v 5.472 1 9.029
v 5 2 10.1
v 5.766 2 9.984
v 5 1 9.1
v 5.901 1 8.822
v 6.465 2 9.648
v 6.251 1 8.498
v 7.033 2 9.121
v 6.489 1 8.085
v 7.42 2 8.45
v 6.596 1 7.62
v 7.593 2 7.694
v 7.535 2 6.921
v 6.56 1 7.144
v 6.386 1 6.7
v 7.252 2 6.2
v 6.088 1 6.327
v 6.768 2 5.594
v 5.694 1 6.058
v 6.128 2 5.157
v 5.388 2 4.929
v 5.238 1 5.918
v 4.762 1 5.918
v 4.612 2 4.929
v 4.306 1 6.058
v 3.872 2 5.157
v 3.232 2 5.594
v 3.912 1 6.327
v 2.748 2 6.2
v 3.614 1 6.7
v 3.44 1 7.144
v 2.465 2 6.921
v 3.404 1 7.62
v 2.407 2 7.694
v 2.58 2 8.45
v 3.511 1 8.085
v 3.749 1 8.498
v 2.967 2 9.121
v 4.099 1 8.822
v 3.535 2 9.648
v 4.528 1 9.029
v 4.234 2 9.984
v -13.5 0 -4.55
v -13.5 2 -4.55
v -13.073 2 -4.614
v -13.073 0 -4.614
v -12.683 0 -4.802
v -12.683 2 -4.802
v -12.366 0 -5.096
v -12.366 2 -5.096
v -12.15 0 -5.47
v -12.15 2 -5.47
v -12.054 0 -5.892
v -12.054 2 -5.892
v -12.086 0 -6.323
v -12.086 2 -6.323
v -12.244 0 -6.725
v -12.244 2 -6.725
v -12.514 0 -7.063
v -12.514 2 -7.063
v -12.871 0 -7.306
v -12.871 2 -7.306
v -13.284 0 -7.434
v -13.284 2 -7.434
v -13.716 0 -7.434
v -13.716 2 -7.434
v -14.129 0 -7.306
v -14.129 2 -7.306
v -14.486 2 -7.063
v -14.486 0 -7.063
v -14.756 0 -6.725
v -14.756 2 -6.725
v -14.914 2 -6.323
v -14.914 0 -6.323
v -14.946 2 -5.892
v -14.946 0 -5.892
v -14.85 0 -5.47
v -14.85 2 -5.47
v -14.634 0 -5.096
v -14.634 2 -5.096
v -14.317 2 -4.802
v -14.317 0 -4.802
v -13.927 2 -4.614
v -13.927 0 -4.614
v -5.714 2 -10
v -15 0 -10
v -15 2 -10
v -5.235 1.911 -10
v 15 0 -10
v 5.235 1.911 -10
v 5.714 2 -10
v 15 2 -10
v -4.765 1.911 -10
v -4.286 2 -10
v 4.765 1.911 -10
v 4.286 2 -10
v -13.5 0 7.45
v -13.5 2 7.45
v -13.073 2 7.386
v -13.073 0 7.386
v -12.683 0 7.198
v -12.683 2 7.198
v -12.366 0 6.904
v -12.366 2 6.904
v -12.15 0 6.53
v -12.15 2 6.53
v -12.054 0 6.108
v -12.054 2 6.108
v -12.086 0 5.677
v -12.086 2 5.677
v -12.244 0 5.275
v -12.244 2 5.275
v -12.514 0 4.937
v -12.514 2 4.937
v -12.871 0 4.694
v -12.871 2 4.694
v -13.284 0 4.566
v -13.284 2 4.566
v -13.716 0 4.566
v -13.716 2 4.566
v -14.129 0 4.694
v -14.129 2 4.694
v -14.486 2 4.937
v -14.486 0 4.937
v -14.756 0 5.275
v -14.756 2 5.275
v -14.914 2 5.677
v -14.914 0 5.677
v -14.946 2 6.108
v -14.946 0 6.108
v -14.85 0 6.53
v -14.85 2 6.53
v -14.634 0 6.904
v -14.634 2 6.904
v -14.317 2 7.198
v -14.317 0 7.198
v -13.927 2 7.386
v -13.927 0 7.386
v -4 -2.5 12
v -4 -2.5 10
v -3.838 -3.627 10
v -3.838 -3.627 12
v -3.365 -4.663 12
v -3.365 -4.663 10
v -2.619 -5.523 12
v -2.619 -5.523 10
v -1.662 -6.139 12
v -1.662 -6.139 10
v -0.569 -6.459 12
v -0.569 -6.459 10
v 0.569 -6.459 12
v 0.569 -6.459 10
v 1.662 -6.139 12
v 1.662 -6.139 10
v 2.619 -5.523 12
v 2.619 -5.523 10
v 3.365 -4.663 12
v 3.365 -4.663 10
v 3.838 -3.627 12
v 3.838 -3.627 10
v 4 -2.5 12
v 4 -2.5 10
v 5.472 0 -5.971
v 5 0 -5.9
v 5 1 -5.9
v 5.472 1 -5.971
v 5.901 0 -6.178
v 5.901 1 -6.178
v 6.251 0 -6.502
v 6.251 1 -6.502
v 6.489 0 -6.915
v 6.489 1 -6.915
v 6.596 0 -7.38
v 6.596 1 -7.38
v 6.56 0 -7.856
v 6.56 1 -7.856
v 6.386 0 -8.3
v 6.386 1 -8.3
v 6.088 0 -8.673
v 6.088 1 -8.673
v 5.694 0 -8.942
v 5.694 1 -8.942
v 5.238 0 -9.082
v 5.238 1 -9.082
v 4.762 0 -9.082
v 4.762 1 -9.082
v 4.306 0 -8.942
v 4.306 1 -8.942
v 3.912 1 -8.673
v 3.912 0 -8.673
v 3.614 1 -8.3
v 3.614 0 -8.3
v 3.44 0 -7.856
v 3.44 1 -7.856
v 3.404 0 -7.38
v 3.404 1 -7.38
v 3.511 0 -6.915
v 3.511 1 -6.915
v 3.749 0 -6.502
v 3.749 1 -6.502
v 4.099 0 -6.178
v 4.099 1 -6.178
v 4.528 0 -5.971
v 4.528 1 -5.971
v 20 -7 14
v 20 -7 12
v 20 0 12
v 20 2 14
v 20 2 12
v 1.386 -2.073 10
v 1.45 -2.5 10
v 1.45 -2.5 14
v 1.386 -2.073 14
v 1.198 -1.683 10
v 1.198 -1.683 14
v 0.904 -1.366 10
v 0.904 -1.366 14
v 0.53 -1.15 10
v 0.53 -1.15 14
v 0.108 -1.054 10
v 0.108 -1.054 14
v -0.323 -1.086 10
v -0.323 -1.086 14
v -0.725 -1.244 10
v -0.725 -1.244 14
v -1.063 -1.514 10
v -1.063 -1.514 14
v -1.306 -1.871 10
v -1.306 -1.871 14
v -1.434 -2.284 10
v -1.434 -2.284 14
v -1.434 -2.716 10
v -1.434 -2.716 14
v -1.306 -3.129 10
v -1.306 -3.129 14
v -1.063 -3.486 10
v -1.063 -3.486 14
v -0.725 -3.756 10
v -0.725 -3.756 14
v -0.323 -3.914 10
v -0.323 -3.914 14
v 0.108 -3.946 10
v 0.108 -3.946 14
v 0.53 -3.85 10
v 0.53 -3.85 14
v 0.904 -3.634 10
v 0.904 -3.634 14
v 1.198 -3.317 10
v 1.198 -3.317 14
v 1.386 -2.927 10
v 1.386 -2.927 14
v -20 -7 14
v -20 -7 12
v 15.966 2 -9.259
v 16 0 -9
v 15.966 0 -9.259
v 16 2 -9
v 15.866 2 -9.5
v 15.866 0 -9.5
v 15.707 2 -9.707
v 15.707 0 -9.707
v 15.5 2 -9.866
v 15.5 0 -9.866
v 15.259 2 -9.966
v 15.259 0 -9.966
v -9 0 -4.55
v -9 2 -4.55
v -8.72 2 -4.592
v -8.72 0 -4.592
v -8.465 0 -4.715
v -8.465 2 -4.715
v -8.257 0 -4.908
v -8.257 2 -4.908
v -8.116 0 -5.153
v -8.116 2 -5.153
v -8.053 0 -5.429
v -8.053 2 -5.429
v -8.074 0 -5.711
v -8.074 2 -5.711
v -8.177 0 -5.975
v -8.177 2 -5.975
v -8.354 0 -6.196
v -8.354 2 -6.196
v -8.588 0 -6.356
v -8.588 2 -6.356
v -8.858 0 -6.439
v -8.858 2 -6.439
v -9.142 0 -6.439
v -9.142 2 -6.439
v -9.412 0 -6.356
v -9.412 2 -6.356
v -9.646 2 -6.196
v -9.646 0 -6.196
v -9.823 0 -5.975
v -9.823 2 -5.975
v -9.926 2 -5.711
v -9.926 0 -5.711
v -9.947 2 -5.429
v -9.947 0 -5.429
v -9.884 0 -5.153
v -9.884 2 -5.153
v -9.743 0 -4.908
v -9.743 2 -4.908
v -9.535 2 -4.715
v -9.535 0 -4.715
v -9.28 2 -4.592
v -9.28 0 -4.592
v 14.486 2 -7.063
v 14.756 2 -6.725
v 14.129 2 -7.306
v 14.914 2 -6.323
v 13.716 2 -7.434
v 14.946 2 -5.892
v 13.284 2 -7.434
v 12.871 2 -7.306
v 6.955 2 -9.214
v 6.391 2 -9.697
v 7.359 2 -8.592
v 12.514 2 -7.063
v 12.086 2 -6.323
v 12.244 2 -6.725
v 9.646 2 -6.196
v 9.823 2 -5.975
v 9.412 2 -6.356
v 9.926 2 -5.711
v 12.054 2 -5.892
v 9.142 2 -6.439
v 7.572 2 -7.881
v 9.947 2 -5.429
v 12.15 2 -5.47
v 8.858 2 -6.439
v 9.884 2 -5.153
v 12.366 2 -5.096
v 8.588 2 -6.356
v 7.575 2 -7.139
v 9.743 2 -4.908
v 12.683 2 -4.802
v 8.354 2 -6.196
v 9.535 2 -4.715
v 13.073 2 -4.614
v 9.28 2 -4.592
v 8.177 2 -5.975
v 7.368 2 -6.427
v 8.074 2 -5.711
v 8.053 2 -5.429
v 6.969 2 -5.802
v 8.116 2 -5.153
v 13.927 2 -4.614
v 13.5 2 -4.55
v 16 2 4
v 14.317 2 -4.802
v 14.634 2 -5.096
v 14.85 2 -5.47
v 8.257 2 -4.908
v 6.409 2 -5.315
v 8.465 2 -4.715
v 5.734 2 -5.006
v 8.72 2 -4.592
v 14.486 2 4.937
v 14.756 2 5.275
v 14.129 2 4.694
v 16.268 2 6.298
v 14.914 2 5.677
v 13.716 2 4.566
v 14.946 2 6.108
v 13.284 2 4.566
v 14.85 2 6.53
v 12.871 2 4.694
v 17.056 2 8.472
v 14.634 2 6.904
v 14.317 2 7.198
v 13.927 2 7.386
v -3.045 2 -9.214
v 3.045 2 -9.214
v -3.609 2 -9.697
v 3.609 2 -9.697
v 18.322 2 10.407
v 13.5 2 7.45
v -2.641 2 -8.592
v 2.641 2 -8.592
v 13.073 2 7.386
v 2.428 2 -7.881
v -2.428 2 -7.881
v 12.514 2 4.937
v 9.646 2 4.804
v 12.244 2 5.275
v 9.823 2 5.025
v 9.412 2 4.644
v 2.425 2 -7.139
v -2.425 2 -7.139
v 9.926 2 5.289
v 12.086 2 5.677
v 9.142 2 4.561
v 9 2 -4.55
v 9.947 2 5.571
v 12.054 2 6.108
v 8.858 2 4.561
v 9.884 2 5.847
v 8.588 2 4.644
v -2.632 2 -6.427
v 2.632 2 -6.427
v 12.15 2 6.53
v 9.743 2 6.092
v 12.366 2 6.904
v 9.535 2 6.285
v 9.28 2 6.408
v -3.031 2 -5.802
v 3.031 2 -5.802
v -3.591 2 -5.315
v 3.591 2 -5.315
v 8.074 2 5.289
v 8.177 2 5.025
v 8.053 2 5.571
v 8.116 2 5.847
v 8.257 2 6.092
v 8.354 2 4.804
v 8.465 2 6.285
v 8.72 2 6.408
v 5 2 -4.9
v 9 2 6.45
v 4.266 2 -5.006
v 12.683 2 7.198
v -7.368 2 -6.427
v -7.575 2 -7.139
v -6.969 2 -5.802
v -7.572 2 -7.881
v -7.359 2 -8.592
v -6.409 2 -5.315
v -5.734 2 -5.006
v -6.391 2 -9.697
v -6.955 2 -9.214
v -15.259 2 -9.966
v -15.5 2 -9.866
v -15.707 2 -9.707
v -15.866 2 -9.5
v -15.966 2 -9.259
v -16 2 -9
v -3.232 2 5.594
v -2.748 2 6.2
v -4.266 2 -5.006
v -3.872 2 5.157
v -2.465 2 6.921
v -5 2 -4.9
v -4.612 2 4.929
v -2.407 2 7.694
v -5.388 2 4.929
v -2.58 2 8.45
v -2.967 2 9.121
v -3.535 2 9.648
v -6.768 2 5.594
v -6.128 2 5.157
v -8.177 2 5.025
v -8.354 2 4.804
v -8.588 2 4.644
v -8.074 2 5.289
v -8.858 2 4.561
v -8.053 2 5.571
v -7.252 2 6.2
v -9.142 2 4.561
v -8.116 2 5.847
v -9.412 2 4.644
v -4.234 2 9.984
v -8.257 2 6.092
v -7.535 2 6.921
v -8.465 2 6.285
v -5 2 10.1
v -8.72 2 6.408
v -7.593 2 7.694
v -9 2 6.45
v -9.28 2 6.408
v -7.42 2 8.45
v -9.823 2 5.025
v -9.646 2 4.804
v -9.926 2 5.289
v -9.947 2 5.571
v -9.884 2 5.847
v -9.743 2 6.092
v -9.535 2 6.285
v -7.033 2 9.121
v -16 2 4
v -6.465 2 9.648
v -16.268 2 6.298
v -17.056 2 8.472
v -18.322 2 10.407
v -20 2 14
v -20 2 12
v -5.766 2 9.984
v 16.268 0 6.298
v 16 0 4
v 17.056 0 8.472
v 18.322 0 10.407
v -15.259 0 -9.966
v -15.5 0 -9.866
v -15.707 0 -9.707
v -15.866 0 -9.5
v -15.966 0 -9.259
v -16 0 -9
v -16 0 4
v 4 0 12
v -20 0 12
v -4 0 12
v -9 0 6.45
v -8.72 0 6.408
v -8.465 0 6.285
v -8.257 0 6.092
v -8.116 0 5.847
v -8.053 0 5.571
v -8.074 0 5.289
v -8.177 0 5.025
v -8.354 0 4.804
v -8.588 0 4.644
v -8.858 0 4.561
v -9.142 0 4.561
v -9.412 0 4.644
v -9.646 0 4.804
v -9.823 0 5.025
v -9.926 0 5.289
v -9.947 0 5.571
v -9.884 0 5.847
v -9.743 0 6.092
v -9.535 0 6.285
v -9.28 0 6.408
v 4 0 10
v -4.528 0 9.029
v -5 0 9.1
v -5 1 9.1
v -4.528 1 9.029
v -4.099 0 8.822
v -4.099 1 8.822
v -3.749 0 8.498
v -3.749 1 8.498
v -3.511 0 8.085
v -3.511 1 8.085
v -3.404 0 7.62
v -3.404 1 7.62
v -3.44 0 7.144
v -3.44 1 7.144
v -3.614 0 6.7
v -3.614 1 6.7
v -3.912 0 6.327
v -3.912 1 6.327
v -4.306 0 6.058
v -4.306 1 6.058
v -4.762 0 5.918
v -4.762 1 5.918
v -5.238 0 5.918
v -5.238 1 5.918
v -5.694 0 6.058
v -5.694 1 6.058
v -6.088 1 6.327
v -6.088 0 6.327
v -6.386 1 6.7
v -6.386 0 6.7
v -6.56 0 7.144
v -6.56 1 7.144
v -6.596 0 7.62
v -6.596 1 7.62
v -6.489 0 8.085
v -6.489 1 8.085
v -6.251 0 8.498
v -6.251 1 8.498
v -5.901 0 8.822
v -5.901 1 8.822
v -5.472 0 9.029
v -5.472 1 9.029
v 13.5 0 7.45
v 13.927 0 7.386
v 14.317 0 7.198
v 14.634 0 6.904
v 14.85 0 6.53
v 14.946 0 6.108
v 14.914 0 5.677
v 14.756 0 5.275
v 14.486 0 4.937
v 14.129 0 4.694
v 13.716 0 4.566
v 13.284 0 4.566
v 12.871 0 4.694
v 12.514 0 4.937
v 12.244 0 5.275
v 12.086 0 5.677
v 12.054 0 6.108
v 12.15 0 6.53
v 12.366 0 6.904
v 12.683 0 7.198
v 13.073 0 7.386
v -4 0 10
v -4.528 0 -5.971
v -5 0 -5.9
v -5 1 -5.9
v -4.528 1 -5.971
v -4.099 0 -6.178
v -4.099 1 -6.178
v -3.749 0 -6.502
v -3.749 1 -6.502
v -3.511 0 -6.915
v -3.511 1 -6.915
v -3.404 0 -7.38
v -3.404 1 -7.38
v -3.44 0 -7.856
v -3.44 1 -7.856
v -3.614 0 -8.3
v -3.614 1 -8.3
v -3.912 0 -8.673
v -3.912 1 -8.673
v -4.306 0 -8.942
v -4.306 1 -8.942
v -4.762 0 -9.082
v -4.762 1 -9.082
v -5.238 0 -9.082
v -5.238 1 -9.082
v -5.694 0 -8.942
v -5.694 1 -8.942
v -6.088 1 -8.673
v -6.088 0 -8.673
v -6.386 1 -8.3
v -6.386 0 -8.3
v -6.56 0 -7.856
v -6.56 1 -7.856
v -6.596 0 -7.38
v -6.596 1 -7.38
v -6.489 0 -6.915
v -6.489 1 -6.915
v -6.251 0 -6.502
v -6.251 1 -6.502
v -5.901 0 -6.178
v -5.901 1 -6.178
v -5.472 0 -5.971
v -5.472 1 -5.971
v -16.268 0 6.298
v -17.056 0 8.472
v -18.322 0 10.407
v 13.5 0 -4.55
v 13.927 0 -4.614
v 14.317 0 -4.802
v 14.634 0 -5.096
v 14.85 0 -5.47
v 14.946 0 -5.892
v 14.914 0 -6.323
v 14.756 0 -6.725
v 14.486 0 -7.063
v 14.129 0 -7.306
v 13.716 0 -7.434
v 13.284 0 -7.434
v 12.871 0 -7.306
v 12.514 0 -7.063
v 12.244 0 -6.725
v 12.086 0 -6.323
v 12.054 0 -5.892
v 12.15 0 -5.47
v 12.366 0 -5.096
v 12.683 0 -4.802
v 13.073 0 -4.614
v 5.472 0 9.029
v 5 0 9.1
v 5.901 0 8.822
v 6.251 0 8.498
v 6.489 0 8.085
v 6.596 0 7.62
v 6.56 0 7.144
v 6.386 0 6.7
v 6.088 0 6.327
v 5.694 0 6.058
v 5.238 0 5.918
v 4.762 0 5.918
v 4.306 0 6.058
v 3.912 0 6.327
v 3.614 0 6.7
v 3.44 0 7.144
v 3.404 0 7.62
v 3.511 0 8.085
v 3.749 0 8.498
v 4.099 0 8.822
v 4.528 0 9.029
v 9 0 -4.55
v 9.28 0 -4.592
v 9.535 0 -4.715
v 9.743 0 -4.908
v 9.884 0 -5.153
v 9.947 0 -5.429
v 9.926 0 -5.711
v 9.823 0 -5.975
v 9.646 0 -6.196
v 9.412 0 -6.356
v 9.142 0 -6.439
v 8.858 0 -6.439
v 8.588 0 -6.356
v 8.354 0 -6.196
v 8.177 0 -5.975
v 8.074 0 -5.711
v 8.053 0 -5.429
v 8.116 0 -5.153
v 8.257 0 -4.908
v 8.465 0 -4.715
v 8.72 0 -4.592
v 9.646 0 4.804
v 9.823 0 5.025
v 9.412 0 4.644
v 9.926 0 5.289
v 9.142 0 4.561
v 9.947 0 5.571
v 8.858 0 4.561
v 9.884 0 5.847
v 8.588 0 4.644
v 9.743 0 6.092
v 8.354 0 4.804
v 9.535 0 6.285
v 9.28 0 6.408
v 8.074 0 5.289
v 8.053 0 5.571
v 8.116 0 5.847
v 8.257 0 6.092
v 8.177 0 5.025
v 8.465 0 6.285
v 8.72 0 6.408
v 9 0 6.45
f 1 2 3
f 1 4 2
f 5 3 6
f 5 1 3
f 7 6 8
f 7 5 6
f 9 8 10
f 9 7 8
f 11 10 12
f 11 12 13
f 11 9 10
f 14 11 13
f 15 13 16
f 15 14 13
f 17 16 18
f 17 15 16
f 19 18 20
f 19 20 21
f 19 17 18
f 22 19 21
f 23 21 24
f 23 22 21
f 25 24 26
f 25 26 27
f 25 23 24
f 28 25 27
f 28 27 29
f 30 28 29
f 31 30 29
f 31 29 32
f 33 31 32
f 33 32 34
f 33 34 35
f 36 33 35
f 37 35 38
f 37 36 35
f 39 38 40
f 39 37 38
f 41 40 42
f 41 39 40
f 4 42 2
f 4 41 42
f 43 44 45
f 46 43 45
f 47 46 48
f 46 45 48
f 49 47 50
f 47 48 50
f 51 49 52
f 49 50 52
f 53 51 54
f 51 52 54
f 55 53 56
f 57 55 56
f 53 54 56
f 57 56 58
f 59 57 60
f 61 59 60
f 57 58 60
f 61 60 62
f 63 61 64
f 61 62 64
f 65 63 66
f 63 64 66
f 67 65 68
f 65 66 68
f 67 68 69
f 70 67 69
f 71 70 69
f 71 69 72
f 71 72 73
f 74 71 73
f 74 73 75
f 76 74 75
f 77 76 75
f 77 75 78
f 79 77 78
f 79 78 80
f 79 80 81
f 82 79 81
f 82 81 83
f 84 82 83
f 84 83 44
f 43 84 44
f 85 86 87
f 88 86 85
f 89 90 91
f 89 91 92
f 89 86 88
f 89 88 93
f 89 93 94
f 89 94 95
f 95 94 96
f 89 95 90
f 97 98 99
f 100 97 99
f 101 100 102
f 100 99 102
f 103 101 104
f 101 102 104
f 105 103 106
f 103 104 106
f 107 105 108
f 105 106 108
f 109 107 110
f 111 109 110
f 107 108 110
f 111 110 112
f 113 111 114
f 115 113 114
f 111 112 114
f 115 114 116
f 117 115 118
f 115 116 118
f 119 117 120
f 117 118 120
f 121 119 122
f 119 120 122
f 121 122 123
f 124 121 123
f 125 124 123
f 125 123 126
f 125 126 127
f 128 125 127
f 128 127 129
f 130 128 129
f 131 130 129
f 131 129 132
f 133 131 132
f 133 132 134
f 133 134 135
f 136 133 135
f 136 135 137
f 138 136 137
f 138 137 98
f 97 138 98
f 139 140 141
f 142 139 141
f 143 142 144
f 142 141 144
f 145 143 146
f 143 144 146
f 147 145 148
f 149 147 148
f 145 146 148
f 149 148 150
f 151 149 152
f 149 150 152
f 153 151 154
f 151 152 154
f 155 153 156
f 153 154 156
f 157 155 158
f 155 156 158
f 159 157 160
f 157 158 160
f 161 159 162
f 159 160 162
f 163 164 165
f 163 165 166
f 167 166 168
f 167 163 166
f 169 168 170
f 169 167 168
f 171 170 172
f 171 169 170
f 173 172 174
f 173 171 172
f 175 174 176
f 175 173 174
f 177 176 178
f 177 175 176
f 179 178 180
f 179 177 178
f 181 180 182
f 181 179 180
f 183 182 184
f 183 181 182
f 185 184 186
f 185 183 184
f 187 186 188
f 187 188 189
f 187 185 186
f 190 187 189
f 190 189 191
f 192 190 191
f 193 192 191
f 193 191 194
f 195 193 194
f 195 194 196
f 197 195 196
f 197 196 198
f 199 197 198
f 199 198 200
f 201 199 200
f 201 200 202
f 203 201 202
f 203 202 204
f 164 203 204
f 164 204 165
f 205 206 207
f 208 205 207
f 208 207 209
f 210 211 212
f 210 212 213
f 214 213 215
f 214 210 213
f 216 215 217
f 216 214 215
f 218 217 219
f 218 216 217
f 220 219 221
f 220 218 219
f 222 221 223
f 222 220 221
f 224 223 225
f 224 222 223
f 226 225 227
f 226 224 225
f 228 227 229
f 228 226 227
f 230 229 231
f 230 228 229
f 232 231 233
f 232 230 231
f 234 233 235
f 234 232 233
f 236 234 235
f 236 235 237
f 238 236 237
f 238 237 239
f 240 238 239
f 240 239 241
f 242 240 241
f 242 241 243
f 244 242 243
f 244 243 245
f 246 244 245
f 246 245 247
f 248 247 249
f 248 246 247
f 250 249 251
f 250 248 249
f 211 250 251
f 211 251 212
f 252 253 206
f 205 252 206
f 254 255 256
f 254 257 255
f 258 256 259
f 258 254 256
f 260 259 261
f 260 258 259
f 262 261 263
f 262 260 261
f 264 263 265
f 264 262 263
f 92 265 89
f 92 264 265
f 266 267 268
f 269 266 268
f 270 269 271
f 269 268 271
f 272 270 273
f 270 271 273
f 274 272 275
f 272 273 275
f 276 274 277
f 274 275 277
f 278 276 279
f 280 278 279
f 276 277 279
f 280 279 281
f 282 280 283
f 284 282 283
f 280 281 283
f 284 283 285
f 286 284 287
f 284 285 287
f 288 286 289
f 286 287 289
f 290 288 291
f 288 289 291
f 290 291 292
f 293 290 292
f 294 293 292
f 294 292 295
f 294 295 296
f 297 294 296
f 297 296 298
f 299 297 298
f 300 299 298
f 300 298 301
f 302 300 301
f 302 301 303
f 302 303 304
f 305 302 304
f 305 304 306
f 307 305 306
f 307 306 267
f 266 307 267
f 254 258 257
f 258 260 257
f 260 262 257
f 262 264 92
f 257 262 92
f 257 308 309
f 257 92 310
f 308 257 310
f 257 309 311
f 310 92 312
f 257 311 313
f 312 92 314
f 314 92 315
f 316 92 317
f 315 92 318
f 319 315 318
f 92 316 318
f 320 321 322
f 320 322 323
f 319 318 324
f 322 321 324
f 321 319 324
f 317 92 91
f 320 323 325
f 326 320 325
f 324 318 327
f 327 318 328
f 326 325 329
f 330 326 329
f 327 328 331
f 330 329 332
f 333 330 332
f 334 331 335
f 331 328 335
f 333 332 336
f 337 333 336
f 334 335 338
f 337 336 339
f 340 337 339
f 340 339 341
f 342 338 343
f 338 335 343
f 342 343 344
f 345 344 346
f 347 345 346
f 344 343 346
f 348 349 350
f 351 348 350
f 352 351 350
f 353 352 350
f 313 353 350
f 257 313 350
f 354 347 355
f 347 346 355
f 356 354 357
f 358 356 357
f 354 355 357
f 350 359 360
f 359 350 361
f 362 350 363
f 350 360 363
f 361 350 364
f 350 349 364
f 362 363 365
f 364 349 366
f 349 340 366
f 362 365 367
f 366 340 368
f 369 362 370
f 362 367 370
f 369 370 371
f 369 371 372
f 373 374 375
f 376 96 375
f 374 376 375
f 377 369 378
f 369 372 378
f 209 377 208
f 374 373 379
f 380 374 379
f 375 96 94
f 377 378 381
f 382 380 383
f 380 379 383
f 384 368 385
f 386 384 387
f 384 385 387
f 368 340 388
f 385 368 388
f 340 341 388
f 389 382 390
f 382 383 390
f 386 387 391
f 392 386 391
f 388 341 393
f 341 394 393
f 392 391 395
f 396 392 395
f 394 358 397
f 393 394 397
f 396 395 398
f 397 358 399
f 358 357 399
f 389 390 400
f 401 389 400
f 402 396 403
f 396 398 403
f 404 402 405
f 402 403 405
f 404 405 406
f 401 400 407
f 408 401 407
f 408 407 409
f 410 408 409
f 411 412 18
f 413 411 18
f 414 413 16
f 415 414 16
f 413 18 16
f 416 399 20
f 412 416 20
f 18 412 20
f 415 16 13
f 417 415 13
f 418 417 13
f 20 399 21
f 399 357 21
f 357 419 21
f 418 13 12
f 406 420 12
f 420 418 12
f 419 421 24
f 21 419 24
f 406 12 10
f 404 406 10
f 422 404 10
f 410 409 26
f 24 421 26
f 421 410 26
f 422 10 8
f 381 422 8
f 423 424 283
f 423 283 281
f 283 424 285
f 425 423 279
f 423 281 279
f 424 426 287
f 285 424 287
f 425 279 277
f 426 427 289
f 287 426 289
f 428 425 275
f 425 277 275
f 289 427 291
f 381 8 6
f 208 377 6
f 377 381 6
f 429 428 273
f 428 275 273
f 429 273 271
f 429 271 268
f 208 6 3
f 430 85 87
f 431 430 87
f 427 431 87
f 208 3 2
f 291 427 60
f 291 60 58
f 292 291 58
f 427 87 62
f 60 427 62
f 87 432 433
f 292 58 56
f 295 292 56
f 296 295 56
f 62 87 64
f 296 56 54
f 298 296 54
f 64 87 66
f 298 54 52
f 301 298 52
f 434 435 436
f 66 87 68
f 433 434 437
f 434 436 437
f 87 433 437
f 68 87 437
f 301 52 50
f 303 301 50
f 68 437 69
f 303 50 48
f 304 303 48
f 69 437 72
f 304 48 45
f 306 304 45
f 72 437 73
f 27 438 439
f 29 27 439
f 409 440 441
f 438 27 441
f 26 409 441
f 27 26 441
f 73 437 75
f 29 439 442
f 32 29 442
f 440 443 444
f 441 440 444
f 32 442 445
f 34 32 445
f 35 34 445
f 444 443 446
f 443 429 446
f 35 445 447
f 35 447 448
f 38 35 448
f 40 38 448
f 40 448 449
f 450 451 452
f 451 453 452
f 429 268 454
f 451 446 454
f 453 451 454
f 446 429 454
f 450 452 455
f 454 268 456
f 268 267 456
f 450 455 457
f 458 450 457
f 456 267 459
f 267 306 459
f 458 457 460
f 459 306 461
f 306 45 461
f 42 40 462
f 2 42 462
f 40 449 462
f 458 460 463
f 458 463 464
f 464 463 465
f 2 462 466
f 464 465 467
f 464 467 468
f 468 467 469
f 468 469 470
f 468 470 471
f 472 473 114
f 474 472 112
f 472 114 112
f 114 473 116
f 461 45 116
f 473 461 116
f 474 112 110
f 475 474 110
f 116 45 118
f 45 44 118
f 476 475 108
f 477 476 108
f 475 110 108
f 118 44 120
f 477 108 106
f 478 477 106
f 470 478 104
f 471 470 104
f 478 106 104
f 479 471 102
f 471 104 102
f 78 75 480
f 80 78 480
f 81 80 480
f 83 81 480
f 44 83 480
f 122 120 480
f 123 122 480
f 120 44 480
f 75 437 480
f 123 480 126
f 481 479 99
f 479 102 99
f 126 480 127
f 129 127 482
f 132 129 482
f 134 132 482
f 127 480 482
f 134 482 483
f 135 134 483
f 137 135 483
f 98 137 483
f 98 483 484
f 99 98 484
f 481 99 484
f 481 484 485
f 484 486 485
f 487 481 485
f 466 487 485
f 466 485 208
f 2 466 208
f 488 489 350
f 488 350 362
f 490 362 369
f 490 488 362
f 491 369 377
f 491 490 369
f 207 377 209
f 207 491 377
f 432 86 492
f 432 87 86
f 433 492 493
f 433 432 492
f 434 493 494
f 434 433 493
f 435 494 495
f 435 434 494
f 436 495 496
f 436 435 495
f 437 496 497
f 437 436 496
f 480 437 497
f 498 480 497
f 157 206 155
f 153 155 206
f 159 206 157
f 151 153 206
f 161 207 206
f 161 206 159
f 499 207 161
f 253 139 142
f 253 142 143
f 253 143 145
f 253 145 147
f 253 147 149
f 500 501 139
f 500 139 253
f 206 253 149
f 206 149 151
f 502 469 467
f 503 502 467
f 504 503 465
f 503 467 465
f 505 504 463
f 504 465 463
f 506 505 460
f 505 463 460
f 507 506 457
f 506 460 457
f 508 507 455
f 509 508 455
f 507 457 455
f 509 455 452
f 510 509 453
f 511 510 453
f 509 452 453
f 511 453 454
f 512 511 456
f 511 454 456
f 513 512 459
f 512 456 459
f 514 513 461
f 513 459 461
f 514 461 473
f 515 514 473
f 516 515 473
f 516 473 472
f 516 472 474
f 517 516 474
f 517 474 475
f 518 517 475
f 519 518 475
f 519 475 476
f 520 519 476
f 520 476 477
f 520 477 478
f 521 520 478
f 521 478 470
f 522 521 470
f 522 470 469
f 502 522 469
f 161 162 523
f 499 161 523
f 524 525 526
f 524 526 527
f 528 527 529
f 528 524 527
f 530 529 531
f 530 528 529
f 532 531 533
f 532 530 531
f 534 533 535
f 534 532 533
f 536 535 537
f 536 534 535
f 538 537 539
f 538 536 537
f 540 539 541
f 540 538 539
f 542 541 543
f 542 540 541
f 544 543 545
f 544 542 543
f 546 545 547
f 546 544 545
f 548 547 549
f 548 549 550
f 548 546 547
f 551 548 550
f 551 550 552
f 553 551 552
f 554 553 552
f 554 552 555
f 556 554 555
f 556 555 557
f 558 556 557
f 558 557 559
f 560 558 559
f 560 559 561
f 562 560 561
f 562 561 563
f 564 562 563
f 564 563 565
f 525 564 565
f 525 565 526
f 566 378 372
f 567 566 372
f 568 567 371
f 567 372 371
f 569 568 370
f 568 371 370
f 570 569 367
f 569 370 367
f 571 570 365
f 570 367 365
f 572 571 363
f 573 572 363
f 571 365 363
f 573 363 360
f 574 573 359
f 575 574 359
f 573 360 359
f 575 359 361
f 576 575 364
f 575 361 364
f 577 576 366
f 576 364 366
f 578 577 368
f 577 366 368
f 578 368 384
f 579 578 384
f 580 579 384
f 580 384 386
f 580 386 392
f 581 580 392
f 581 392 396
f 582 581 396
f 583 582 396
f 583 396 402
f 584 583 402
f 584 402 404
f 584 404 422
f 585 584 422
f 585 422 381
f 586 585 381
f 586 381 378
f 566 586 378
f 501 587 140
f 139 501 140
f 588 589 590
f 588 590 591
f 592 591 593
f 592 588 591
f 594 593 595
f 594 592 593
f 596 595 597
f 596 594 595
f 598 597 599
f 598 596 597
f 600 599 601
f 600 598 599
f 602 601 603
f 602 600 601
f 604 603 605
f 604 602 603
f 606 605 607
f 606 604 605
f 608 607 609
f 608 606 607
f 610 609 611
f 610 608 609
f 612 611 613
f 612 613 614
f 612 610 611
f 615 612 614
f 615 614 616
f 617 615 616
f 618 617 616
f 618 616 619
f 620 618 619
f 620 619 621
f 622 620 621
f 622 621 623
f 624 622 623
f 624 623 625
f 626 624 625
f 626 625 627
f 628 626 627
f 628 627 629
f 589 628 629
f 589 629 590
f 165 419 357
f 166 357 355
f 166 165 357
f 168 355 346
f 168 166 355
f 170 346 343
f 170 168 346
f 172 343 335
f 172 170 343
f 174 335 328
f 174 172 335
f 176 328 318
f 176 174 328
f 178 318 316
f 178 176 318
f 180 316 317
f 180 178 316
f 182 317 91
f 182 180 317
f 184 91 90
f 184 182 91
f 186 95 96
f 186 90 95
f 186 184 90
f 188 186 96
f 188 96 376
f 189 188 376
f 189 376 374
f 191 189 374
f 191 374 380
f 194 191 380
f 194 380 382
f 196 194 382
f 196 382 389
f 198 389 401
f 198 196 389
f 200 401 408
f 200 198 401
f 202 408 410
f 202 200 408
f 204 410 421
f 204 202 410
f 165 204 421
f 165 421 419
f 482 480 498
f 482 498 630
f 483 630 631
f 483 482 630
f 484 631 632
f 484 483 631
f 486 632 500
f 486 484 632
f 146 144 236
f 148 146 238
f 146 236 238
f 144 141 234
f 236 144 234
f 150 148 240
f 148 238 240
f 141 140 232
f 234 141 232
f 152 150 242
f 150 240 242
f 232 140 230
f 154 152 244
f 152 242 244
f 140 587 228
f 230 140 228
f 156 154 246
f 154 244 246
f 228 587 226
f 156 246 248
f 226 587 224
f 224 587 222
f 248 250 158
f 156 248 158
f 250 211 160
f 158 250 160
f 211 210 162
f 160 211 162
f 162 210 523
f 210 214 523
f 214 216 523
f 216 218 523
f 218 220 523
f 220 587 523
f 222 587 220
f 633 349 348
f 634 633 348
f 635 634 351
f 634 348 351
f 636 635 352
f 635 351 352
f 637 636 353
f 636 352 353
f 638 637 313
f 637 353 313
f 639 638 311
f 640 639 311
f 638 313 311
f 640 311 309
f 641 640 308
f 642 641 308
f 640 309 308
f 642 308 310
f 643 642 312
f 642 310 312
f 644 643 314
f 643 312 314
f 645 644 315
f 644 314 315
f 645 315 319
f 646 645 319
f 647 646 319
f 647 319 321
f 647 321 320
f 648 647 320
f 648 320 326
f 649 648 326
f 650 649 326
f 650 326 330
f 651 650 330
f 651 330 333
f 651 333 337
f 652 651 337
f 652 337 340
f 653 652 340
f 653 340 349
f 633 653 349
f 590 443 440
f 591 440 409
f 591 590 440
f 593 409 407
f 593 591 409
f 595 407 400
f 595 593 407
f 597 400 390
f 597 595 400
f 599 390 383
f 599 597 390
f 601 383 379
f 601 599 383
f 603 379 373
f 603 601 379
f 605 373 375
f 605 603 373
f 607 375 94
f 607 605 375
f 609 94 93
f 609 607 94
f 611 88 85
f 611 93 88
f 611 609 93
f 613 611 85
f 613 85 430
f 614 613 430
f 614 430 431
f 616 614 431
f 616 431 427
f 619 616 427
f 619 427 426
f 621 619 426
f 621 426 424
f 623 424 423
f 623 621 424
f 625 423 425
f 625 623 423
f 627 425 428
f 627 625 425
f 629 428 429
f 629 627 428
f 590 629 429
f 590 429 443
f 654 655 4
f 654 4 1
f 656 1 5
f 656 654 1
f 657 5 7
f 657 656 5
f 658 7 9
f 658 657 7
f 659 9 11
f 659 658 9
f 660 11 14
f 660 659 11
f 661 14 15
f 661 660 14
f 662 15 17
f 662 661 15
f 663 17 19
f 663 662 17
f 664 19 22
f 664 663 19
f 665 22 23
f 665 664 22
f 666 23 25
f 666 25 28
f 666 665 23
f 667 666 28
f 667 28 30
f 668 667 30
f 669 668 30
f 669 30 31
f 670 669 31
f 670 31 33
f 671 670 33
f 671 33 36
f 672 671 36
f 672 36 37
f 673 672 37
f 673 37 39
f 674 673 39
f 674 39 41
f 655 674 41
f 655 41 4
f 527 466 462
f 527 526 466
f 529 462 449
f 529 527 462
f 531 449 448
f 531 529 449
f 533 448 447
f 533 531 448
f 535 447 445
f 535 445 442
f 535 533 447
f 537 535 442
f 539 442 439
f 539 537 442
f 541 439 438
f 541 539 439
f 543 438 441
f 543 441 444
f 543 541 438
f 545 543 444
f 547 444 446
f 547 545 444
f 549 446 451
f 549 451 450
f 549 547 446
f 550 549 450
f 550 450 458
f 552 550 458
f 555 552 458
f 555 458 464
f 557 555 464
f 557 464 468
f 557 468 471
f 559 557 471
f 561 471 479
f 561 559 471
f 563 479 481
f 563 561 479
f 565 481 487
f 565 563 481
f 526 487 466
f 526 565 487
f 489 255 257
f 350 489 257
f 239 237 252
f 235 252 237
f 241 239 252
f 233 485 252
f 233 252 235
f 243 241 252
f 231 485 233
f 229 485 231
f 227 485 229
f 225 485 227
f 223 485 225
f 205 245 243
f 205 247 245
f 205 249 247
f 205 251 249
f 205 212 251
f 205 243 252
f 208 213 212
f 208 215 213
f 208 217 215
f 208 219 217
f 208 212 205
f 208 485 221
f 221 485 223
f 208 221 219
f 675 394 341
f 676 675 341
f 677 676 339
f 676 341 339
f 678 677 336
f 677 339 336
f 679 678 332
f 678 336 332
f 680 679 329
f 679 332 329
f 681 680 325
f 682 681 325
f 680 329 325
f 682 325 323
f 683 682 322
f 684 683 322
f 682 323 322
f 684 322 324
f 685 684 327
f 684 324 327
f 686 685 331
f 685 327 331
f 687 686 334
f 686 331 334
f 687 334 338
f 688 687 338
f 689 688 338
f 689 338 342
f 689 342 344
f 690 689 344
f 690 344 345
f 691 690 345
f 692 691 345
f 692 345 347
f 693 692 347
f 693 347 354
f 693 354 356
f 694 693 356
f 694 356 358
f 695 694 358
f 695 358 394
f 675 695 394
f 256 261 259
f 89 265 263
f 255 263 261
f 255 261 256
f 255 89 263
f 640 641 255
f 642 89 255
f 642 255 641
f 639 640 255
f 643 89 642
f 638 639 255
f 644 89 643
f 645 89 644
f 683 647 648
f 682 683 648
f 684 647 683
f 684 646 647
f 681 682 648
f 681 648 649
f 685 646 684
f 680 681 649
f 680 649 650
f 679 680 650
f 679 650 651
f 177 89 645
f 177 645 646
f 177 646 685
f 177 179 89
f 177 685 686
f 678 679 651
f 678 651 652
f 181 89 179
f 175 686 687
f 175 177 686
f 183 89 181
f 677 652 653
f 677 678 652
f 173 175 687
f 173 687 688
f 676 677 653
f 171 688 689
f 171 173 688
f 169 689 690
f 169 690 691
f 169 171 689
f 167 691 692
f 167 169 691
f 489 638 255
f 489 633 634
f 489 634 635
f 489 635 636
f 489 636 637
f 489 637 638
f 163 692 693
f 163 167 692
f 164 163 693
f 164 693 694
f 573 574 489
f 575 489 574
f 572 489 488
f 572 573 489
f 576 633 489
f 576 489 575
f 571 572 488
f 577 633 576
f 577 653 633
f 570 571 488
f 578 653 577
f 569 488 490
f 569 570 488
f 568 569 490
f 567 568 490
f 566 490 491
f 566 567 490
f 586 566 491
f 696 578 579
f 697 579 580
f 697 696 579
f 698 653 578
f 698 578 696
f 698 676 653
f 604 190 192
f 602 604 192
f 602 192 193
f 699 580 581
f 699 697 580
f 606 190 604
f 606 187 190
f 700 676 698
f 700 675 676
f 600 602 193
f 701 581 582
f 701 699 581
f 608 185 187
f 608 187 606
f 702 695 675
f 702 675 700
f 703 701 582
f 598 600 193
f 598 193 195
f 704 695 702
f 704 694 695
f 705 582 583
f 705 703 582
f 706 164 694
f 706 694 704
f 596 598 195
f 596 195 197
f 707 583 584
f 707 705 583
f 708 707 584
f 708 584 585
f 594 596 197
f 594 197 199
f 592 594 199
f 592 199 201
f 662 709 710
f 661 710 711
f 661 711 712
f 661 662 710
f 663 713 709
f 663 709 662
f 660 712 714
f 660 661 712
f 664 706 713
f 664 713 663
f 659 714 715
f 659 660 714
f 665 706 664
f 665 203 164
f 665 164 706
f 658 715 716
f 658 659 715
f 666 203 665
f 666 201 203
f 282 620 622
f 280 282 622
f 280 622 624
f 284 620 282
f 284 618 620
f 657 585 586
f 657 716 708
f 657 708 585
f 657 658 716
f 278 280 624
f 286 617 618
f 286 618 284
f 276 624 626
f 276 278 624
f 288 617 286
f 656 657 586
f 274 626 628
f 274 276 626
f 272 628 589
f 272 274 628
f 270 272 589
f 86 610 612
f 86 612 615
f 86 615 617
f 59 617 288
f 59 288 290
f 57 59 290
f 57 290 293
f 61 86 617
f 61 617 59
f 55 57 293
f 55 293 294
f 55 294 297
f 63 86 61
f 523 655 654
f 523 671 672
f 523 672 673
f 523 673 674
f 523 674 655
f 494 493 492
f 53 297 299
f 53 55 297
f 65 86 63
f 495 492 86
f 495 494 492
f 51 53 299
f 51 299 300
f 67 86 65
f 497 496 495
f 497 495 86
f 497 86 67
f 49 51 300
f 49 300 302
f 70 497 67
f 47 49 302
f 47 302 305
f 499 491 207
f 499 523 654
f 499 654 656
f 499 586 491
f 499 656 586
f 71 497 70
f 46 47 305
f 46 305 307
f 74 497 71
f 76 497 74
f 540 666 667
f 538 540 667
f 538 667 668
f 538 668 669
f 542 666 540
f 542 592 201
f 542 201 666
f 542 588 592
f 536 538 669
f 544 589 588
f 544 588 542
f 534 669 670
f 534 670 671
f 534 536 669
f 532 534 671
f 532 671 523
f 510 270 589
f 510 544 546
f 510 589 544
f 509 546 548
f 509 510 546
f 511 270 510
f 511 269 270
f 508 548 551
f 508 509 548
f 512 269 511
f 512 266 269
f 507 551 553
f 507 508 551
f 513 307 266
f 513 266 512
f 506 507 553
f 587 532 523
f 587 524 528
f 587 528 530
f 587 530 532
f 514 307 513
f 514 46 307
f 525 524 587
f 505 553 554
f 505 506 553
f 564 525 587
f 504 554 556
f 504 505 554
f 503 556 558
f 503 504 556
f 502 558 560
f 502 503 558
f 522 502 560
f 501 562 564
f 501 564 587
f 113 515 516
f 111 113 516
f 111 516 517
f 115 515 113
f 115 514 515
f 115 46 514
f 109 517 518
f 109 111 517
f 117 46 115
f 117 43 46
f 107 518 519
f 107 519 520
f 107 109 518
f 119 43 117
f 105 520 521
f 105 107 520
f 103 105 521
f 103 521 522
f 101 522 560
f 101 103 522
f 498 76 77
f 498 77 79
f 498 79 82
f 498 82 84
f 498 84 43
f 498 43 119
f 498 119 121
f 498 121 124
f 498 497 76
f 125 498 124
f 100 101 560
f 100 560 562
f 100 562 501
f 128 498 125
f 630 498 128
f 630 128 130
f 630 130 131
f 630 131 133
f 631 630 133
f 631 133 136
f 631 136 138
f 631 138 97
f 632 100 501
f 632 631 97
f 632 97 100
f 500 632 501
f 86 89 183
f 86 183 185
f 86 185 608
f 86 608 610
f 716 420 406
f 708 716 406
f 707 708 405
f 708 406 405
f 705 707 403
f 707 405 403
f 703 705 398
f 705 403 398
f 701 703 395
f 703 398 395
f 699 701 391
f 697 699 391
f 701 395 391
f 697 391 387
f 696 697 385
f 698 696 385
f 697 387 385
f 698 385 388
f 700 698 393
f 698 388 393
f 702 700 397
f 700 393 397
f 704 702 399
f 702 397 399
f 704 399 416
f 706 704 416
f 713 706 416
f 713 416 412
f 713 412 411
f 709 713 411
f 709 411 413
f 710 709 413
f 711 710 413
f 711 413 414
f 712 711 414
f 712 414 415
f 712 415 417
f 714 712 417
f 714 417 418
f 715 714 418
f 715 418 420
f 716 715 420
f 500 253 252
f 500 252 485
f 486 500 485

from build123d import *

# Parameters (mm, degrees)
SKETCH1_W           = 32
SKETCH1_H           = 20
SKETCH1_R           = 1.6
BOSS_EXTRUDE1_DEPTH = 2
SKETCH3_W           = 40
SKETCH3_H           = 9
SKETCH3_R           = 1.45
BOSS_EXTRUDE2_DEPTH = 4
CUT_EXTRUDE1_DEPTH  = 2
FILLET1_R           = 10
CHAMFER1_SIZE       = 1
CUT_EXTRUDE2_REACH  = 28.019
SKETCH12_R          = 1.45
SKETCH12_R_2        = 0.95
FILLET2_R           = 1


with BuildPart() as part:
    # Sketch1 → Boss-Extrude1 (new body)
    with BuildSketch(Plane(origin=(0, 0, 0), x_dir=(1, 0, 0), z_dir=(0, 1, 0))):
        Rectangle(SKETCH1_W, SKETCH1_H)
        with Locations(Location((-5, 7.5, 0), (0, 0, 270))):
            Circle(SKETCH1_R, mode=Mode.SUBTRACT)
        with Locations(Location((5, 7.5, 0), (0, 0, 270))):
            Circle(SKETCH1_R, mode=Mode.SUBTRACT)
        with Locations(Location((-5, -7.5, 0), (0, 0, 270))):
            Circle(SKETCH1_R, mode=Mode.SUBTRACT)
        with Locations(Location((5, -7.5, 0), (0, 0, 270))):
            Circle(SKETCH1_R, mode=Mode.SUBTRACT)
    extrude(amount=BOSS_EXTRUDE1_DEPTH)

    # Sketch3 → Boss-Extrude2 (add)
    with BuildSketch(Plane.XY.offset(10)):
        with Locations((0, -2.5)):
            Rectangle(SKETCH3_W, SKETCH3_H)
        with Locations((0, -2.5)):
            Circle(SKETCH3_R, mode=Mode.SUBTRACT)
    extrude(amount=BOSS_EXTRUDE2_DEPTH)

    # Sketch4 → Cut-Extrude1 (cut)
    with BuildSketch(Plane(origin=(0, 0, 10), x_dir=(-1, 0, 0), z_dir=(0, 0, -1))):
        with BuildLine():
            Line((-16, 2), (-20, 2))
            Line((-20, 2), (-20, -7))
            Line((-20, -7), (20, -7))
            Line((20, -7), (20, 2))
            Line((20, 2), (16, 2))
            Line((16, 2), (16, 0))
            Line((16, 0), (4, 0))
            Line((4, 0), (4, -2.5))
            ThreePointArc((4, -2.5), (0, -6.5), (-4, -2.5))
            Line((-4, -2.5), (-4, 0))
            Line((-4, 0), (-16, 0))
            Line((-16, 0), (-16, 2))
        make_face()
    extrude(amount=-CUT_EXTRUDE1_DEPTH, mode=Mode.SUBTRACT)

    # Fillet1
    # the kernel refuses this fillet: 10 mm, written as the material it adds along each edge
    with BuildSketch(Plane(origin=(16, 0, 12), x_dir=(0, 0, -1), z_dir=(0, 1, 0)), Plane(origin=(-16, 2, 12), x_dir=(0, 0, -1), z_dir=(0, -1, 0))) as fillet1_piece_1:
        with BuildLine():
            CenterArc((8, -10), FILLET1_R, 90, 53.130102354)
            Line((0, -4), (-0.16, -3.88))
            ThreePointArc((-0.16, -3.88), (-0.2, -2), (-0.2, 0))
            Line((-0.2, 0), (0, 0.2))
            Line((0, 0.2), (8, 0.2))
            Line((8, 0.2), (8, 0))
        make_face()
    extrude(amount=2)

    # Chamfer1
    # the kernel refuses this chamfer: 1 mm, written as the material it takes off along each edge
    with BuildSketch(Plane(origin=(-5, 2, -7.5), x_dir=(0, 0, 1), z_dir=(-1, 0, 0))) as chamfer1_piece_1:
        Polygon((1.6 + CHAMFER1_SIZE, 0), (1.6, -CHAMFER1_SIZE), (1.6, 0), align=None)
    revolve(axis=Axis((-5, 2, -7.5), (0, 1, 0)), mode=Mode.SUBTRACT)
    with BuildSketch(Plane(origin=(5, 2, -7.5), x_dir=(0, 0, 1), z_dir=(-1, 0, 0))) as chamfer1_piece_2:
        Polygon((1.6 + CHAMFER1_SIZE, 0), (1.6, -CHAMFER1_SIZE), (1.6, 0), align=None)
    revolve(axis=Axis((5, 2, -7.5), (0, 1, 0)), mode=Mode.SUBTRACT)
    with BuildSketch(Plane(origin=(-5, 2, 7.5), x_dir=(0, 0, 1), z_dir=(-1, 0, 0))) as chamfer1_piece_3:
        Polygon((1.6 + CHAMFER1_SIZE, 0), (1.6, -CHAMFER1_SIZE), (1.6, 0), align=None)
    revolve(axis=Axis((-5, 2, 7.5), (0, 1, 0)), mode=Mode.SUBTRACT)
    with BuildSketch(Plane(origin=(5, 2, 7.5), x_dir=(0, 0, 1), z_dir=(-1, 0, 0))) as chamfer1_piece_4:
        Polygon((1.6 + CHAMFER1_SIZE, 0), (1.6, -CHAMFER1_SIZE), (1.6, 0), align=None)
    revolve(axis=Axis((5, 2, 7.5), (0, 1, 0)), mode=Mode.SUBTRACT)

    # Sketch12 → Cut-Extrude2 (cut, up to next)
    with BuildSketch(Plane(origin=(0, 2, 0), x_dir=(1, 0, 0), z_dir=(0, 1, 0)), mode=Mode.PRIVATE) as cut_extrude2_sk1:
        with Locations(Location((-13.5, 6, 0), (0, 0, 270))):
            Circle(SKETCH12_R)
    cut_extrude2_tool1 = extrude(cut_extrude2_sk1.sketch, amount=-CUT_EXTRUDE2_REACH, mode=Mode.PRIVATE) & part.part
    # Sketch12 → Cut-Extrude2 (cut, up to next)
    with BuildSketch(Plane(origin=(0, 2, 0), x_dir=(1, 0, 0), z_dir=(0, 1, 0)), mode=Mode.PRIVATE) as cut_extrude2_sk2:
        with Locations(Location((-13.5, -6, 0), (0, 0, 270))):
            Circle(SKETCH12_R)
    cut_extrude2_tool2 = extrude(cut_extrude2_sk2.sketch, amount=-CUT_EXTRUDE2_REACH, mode=Mode.PRIVATE) & part.part
    # Sketch12 → Cut-Extrude2 (cut, up to next)
    with BuildSketch(Plane(origin=(0, 2, 0), x_dir=(1, 0, 0), z_dir=(0, 1, 0)), mode=Mode.PRIVATE) as cut_extrude2_sk3:
        with Locations(Location((13.5, -6, 0), (0, 0, 270))):
            Circle(SKETCH12_R)
    cut_extrude2_tool3 = extrude(cut_extrude2_sk3.sketch, amount=-CUT_EXTRUDE2_REACH, mode=Mode.PRIVATE) & part.part
    # Sketch12 → Cut-Extrude2 (cut, up to next)
    with BuildSketch(Plane(origin=(0, 2, 0), x_dir=(1, 0, 0), z_dir=(0, 1, 0)), mode=Mode.PRIVATE) as cut_extrude2_sk4:
        with Locations(Location((13.5, 6, 0), (0, 0, 270))):
            Circle(SKETCH12_R)
    cut_extrude2_tool4 = extrude(cut_extrude2_sk4.sketch, amount=-CUT_EXTRUDE2_REACH, mode=Mode.PRIVATE) & part.part
    # Sketch12 → Cut-Extrude2 (cut, up to next)
    with BuildSketch(Plane(origin=(0, 2, 0), x_dir=(1, 0, 0), z_dir=(0, 1, 0)), mode=Mode.PRIVATE) as cut_extrude2_sk5:
        with Locations(Location((-9, 5.5, 0), (0, 0, 270))):
            Circle(SKETCH12_R_2)
    cut_extrude2_tool5 = extrude(cut_extrude2_sk5.sketch, amount=-CUT_EXTRUDE2_REACH, mode=Mode.PRIVATE) & part.part
    # Sketch12 → Cut-Extrude2 (cut, up to next)
    with BuildSketch(Plane(origin=(0, 2, 0), x_dir=(1, 0, 0), z_dir=(0, 1, 0)), mode=Mode.PRIVATE) as cut_extrude2_sk6:
        with Locations(Location((9, 5.5, 0), (0, 0, 270))):
            Circle(SKETCH12_R_2)
    cut_extrude2_tool6 = extrude(cut_extrude2_sk6.sketch, amount=-CUT_EXTRUDE2_REACH, mode=Mode.PRIVATE) & part.part
    # Sketch12 → Cut-Extrude2 (cut, up to next)
    with BuildSketch(Plane(origin=(0, 2, 0), x_dir=(1, 0, 0), z_dir=(0, 1, 0)), mode=Mode.PRIVATE) as cut_extrude2_sk7:
        with Locations(Location((9, -5.5, 0), (0, 0, 270))):
            Circle(SKETCH12_R_2)
    cut_extrude2_tool7 = extrude(cut_extrude2_sk7.sketch, amount=-CUT_EXTRUDE2_REACH, mode=Mode.PRIVATE) & part.part
    # Sketch12 → Cut-Extrude2 (cut, up to next)
    with BuildSketch(Plane(origin=(0, 2, 0), x_dir=(1, 0, 0), z_dir=(0, 1, 0)), mode=Mode.PRIVATE) as cut_extrude2_sk8:
        with Locations(Location((-9, -5.5, 0), (0, 0, 270))):
            Circle(SKETCH12_R_2)
    cut_extrude2_tool8 = extrude(cut_extrude2_sk8.sketch, amount=-CUT_EXTRUDE2_REACH, mode=Mode.PRIVATE) & part.part
    add(cut_extrude2_tool1.solids().sort_by_distance((-13.5, 2, -6))[0], mode=Mode.SUBTRACT)
    add(cut_extrude2_tool2.solids().sort_by_distance((-13.5, 2, 6))[0], mode=Mode.SUBTRACT)
    add(cut_extrude2_tool3.solids().sort_by_distance((13.5, 2, 6))[0], mode=Mode.SUBTRACT)
    add(cut_extrude2_tool4.solids().sort_by_distance((13.5, 2, -6))[0], mode=Mode.SUBTRACT)
    add(cut_extrude2_tool5.solids().sort_by_distance((-9, 2, -5.5))[0], mode=Mode.SUBTRACT)
    add(cut_extrude2_tool6.solids().sort_by_distance((9, 2, -5.5))[0], mode=Mode.SUBTRACT)
    add(cut_extrude2_tool7.solids().sort_by_distance((9, 2, 5.5))[0], mode=Mode.SUBTRACT)
    add(cut_extrude2_tool8.solids().sort_by_distance((-9, 2, 5.5))[0], mode=Mode.SUBTRACT)

    # Fillet2
    fillet2_edges = [part.edges().sort_by_distance(p)[0] for p in [
        (-16, 1, -10),
        (16, 1, -10),
    ]]
    fillet(fillet2_edges, radius=FILLET2_R)


solid = part.part
